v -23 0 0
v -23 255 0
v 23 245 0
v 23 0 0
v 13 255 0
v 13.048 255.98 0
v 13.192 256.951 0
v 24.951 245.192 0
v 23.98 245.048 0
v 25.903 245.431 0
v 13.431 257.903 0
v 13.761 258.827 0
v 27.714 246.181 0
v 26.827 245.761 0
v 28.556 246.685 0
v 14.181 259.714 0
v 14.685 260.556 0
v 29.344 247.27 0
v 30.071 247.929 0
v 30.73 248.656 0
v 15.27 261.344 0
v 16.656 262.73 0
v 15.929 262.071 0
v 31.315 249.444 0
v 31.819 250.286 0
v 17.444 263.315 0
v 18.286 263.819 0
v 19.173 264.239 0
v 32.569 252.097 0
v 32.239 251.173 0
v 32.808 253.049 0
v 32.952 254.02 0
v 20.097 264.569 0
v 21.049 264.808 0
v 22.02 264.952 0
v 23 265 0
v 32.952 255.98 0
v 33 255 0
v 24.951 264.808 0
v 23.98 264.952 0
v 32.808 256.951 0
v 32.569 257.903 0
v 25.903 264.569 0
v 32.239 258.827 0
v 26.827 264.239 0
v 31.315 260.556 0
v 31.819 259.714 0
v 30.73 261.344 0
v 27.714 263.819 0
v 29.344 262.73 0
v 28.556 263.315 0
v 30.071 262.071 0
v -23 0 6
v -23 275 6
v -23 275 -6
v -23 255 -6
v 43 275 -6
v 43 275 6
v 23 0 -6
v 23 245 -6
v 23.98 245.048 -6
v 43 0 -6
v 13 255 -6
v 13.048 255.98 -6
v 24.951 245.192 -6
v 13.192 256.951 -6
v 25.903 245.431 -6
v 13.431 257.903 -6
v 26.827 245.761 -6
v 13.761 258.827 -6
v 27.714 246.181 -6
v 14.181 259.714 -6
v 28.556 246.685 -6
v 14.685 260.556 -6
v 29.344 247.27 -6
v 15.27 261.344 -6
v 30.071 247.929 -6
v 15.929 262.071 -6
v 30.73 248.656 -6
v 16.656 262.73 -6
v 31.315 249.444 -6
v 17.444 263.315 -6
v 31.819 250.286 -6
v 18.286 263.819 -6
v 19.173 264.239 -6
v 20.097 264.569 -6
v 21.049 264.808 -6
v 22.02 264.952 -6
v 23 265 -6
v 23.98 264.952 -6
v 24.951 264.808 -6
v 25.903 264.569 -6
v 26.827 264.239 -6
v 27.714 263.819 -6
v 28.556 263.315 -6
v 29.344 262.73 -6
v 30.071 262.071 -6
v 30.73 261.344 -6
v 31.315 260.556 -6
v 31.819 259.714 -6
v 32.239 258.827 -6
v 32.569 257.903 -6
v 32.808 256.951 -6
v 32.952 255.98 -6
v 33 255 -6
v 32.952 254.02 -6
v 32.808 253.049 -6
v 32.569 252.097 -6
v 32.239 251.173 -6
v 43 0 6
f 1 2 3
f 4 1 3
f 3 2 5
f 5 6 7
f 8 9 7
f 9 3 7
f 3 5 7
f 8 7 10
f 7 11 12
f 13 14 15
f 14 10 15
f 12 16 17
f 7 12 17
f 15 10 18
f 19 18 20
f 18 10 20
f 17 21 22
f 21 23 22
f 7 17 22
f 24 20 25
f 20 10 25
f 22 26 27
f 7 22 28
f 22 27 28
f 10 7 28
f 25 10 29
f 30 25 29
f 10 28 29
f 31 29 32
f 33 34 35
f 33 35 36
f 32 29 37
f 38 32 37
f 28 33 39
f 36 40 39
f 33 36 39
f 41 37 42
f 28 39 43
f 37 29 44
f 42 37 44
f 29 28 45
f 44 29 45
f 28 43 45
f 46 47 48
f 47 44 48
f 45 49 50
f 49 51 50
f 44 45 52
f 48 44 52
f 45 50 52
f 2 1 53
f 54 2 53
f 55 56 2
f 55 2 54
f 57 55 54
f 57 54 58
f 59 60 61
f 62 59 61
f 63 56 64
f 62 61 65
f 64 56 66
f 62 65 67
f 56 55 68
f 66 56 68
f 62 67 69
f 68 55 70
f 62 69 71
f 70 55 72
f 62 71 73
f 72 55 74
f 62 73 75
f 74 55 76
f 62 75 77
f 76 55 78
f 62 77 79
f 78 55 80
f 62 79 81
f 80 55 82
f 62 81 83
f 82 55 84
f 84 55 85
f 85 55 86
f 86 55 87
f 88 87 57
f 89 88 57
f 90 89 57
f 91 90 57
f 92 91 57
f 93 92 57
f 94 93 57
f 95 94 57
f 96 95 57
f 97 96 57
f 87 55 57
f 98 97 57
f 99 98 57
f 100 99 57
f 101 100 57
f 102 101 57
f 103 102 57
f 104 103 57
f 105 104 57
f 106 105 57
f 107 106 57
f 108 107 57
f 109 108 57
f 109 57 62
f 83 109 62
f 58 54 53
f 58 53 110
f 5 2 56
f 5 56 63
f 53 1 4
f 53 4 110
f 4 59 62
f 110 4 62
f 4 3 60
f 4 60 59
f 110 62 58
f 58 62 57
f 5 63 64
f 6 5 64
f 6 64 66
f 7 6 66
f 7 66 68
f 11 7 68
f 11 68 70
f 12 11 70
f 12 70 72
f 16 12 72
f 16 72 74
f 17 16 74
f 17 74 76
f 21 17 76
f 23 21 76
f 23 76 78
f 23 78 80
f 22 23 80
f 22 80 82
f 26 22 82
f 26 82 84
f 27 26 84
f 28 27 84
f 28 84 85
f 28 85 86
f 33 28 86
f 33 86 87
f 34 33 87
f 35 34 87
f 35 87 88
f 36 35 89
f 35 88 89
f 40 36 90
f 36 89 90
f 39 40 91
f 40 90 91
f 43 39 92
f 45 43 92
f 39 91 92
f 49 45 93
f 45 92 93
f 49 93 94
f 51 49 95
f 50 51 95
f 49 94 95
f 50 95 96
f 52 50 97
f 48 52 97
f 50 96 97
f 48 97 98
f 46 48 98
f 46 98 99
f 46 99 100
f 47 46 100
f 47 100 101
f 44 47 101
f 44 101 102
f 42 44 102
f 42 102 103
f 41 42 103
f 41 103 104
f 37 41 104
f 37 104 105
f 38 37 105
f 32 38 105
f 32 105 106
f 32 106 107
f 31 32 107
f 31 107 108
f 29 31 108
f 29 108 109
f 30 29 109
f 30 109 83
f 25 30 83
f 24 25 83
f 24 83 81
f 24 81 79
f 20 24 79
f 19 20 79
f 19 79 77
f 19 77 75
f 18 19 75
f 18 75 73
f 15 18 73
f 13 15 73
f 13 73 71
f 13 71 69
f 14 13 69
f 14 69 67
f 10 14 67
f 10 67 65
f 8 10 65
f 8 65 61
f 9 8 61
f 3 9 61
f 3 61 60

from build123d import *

# Parameters (mm, degrees)
BOSS_EXTRUDE1_DEPTH = 6
SKETCH2_W           = 66
SKETCH2_H           = 275
BOSS_EXTRUDE2_DEPTH = 6
SKETCH3_R           = 10
CUT_EXTRUDE1_DEPTH  = 6


with BuildPart() as part:
    # Sketch1 → Boss-Extrude1 (new body)
    with BuildSketch(Plane.XY):
        Polygon((23, 255), (23, 0), (43, 0), (43, 275), (-23, 275), (-23, 255), align=None)
    extrude(amount=-BOSS_EXTRUDE1_DEPTH)

    # Sketch2 → Boss-Extrude2 (add)
    with BuildSketch(Plane.XY):
        with Locations((10, 137.5)):
            Rectangle(SKETCH2_W, SKETCH2_H)
    extrude(amount=BOSS_EXTRUDE2_DEPTH)

    # Sketch3 → Cut-Extrude1 (cut)
    with BuildSketch(Plane(origin=(0, 0, -6), x_dir=(-1, 0, 0), z_dir=(0, 0, -1))):
        with Locations((-23, 255)):
            Circle(SKETCH3_R)
    extrude(amount=-CUT_EXTRUDE1_DEPTH, mode=Mode.SUBTRACT)


solid = part.part
